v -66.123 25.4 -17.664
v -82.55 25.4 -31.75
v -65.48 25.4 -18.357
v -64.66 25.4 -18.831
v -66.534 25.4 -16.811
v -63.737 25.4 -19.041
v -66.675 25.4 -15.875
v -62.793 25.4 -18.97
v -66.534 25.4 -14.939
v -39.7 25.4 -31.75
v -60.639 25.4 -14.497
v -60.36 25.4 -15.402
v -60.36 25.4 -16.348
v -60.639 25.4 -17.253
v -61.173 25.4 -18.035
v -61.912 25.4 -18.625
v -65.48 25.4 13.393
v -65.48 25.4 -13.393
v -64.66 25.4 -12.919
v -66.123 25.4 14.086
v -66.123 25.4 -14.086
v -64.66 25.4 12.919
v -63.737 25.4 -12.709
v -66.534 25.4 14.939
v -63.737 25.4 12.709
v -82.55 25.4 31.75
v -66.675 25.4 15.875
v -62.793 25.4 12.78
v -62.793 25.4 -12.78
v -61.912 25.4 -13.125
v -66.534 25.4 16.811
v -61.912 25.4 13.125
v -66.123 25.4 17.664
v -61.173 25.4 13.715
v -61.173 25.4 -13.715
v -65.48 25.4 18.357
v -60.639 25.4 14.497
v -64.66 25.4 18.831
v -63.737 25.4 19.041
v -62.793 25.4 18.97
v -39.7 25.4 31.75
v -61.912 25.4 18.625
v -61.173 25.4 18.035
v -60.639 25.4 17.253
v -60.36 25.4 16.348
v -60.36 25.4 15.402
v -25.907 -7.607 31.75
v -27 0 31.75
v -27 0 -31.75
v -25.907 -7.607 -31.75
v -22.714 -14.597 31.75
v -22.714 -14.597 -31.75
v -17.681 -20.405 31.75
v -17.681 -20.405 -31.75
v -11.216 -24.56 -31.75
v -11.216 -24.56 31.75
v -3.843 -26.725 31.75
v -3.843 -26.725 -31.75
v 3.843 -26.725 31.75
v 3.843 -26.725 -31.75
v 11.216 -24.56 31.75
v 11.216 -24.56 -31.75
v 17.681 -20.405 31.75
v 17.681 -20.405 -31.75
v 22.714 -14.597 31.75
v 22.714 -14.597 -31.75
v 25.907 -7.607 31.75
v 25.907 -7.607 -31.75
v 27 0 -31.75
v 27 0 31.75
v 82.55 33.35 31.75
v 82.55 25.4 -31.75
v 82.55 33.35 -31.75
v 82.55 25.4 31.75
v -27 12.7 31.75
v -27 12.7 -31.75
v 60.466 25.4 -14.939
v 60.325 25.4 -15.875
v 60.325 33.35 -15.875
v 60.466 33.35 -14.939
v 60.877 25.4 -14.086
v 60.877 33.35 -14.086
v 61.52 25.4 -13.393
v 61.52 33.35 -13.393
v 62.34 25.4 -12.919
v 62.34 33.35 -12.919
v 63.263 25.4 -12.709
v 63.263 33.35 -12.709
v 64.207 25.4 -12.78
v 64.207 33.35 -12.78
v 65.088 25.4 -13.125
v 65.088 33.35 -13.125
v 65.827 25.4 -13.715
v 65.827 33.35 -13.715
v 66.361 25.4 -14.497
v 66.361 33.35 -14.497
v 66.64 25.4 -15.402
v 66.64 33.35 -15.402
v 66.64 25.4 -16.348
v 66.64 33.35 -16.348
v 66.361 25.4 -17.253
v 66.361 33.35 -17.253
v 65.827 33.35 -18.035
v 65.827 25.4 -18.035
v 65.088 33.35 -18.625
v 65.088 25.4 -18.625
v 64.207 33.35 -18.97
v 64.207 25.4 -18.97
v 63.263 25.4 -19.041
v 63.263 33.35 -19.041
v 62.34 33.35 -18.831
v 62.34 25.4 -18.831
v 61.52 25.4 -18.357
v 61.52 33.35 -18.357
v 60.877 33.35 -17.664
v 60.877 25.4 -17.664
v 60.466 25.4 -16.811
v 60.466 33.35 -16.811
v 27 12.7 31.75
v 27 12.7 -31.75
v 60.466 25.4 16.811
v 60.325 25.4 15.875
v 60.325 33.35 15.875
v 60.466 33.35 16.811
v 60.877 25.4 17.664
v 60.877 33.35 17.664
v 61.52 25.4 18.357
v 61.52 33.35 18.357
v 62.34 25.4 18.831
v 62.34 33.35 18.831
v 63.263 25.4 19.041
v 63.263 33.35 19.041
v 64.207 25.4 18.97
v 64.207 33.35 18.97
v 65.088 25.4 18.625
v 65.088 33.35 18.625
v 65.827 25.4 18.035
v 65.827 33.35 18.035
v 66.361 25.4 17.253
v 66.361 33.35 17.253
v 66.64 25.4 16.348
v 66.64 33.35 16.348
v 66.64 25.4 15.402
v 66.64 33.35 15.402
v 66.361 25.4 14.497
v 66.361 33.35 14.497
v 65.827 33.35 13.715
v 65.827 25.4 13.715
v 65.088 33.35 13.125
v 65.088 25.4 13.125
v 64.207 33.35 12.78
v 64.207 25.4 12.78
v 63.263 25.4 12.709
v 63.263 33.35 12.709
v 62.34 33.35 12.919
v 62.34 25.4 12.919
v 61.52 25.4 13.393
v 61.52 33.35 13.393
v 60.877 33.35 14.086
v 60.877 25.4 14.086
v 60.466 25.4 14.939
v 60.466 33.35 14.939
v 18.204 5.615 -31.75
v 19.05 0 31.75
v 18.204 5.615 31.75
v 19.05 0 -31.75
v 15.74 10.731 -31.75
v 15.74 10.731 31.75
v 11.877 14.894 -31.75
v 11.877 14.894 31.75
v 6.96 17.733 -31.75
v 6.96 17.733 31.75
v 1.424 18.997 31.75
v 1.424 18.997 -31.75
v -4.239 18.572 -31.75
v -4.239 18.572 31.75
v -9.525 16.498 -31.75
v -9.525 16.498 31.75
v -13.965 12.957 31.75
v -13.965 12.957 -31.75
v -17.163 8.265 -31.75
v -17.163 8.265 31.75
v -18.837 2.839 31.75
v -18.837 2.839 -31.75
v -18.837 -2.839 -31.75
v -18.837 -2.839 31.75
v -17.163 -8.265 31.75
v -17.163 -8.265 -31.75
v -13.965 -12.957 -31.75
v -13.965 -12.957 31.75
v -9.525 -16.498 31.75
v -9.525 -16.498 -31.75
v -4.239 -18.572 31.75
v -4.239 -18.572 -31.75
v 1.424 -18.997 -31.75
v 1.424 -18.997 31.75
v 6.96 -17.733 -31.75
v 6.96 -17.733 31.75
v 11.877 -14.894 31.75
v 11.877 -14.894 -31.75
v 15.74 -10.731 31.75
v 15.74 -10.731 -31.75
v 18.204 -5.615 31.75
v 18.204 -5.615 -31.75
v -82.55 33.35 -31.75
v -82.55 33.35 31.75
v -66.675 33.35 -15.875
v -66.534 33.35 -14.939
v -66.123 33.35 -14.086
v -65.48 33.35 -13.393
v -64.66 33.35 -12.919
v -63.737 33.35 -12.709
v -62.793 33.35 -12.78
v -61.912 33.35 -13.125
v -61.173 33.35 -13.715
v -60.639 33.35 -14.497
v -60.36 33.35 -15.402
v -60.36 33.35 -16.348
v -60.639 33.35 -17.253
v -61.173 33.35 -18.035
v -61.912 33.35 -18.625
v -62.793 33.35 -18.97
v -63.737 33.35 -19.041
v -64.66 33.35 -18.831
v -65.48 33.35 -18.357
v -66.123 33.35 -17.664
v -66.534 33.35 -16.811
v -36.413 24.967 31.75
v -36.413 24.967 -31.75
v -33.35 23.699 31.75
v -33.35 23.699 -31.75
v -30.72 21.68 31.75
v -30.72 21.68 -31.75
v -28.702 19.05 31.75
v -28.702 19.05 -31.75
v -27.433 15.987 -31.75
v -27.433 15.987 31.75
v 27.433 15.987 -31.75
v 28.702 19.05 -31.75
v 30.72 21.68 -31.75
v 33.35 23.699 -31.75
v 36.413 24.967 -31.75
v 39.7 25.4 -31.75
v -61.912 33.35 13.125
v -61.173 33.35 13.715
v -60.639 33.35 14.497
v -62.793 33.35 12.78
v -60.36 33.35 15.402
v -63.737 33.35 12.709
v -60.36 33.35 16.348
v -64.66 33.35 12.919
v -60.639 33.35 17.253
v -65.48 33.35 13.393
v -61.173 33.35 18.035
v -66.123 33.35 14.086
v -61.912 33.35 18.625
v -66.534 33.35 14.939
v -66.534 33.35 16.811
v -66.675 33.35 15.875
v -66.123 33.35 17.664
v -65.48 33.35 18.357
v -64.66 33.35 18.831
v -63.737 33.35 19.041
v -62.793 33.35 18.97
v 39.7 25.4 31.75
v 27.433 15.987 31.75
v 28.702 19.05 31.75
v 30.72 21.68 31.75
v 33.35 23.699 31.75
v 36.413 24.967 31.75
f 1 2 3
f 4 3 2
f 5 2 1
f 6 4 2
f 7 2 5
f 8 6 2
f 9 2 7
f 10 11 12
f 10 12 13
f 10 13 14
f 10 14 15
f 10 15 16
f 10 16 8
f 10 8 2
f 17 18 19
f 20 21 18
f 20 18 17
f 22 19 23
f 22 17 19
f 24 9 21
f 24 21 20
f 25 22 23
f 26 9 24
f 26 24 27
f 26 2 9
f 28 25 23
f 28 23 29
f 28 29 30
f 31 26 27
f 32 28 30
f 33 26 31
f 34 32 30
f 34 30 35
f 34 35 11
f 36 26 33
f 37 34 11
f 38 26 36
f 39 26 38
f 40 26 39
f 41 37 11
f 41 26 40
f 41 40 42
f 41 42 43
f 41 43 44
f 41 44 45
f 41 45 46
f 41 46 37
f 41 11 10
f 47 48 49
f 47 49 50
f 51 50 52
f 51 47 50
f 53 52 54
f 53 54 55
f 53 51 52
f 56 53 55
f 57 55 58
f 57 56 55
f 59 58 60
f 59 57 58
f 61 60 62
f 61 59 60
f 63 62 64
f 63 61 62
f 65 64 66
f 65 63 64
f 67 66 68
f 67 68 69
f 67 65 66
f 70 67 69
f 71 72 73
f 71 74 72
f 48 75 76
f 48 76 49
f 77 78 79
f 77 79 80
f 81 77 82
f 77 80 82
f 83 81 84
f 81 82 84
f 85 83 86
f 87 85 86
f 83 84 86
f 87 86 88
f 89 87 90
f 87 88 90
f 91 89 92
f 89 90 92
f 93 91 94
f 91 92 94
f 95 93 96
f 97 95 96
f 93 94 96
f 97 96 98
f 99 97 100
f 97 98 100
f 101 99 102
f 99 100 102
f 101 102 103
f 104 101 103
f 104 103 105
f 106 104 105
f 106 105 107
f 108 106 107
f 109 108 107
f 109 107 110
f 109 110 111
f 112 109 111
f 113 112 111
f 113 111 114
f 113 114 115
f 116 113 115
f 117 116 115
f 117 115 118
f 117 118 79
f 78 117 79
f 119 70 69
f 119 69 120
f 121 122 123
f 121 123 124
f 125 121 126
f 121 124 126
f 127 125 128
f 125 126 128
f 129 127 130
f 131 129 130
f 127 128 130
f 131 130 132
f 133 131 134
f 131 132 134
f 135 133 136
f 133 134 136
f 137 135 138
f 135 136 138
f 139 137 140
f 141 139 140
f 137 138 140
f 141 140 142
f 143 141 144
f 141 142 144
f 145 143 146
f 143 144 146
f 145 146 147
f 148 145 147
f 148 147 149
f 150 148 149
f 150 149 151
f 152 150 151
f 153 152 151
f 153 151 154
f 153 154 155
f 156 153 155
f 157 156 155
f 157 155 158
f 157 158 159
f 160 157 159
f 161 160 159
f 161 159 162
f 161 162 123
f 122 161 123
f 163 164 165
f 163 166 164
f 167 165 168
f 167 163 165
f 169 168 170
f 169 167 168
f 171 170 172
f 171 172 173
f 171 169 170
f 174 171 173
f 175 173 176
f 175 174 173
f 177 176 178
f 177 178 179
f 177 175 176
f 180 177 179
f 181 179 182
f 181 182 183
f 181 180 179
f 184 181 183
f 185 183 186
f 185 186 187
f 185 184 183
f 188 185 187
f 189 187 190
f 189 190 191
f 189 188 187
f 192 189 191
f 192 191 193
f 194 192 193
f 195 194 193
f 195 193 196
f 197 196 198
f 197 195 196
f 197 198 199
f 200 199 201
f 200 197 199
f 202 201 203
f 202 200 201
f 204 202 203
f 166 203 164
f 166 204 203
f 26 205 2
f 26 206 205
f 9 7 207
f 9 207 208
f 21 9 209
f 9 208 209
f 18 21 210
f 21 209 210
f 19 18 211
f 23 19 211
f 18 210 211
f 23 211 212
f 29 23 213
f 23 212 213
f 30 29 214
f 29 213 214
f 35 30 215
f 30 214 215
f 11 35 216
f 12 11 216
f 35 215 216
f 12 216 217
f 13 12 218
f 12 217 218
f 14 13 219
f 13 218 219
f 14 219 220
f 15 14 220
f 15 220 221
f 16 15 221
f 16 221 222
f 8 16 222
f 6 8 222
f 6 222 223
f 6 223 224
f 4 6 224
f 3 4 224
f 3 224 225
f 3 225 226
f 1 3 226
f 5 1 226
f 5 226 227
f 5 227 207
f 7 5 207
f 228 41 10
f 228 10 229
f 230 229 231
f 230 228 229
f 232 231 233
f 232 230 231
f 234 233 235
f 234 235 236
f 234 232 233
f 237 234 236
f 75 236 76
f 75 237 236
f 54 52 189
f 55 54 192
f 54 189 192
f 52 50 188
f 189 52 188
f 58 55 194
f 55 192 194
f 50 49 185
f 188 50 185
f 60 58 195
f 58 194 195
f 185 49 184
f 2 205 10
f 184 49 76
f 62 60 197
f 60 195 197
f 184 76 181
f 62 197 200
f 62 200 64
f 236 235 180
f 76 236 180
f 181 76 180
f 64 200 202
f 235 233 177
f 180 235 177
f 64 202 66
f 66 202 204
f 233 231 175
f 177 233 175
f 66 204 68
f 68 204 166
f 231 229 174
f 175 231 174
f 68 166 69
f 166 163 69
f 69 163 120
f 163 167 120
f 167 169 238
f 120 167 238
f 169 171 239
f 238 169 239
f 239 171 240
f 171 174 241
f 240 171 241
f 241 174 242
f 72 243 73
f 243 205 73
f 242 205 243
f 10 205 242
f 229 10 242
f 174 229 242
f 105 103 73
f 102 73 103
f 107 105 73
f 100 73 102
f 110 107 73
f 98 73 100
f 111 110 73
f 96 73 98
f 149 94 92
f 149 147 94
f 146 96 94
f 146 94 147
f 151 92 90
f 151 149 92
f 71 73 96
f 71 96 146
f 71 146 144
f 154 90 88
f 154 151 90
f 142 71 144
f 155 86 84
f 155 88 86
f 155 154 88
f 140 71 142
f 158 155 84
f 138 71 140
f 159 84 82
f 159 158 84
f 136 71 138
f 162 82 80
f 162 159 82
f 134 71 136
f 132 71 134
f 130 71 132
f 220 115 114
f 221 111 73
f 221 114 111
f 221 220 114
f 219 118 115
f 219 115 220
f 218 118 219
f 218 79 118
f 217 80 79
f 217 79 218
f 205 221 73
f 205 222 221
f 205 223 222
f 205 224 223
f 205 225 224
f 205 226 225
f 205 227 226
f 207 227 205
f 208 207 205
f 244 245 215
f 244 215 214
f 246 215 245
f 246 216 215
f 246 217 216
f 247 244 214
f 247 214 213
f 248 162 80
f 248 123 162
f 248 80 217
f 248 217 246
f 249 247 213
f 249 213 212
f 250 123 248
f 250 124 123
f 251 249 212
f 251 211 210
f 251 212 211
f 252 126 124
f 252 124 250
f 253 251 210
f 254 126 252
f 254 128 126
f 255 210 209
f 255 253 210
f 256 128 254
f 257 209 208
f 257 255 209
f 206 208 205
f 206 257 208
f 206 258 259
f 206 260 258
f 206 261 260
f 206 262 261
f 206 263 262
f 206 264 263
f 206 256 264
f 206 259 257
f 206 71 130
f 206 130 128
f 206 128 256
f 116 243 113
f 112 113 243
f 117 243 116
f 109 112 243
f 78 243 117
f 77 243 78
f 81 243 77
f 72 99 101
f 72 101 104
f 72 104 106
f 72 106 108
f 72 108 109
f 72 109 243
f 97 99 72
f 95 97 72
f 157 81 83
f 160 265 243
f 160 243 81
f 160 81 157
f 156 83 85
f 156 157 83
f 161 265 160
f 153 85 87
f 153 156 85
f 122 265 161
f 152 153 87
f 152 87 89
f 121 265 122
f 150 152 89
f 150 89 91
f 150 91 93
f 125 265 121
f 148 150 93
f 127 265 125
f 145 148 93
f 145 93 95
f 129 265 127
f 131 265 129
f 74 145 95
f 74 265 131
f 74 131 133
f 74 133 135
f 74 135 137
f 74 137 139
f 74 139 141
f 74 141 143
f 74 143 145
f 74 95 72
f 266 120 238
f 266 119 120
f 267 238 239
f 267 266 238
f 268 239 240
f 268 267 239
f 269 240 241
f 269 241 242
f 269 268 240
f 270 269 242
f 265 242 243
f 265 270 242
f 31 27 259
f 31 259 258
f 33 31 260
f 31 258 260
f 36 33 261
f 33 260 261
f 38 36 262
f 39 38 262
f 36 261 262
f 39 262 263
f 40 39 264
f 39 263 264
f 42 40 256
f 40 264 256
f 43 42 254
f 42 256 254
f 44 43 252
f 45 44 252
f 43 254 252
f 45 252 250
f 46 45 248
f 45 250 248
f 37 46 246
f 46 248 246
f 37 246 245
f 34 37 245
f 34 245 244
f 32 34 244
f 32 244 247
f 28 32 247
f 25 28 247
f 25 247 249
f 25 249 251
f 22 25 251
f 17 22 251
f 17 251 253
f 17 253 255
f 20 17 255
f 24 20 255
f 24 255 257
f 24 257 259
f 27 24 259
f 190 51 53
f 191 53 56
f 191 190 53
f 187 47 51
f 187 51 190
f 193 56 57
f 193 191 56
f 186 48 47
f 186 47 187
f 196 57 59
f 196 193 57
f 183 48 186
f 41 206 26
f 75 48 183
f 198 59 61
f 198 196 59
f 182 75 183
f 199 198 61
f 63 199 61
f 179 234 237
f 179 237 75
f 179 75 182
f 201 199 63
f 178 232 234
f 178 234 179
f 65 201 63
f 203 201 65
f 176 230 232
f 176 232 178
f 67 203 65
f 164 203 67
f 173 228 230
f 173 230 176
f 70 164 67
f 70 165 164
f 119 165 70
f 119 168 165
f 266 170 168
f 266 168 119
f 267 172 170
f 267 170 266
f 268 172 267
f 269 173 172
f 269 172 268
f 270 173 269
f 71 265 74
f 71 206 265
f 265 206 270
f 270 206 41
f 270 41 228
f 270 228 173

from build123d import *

# Parameters (mm, degrees)
SKETCH1_R           = 19.05
BOSS_EXTRUDE1_DEPTH = 31.75
SKETCH2_R           = 3.175
CUT_EXTRUDE1_DEPTH  = 108.073506434


with BuildPart() as part:
    # Sketch1 → Boss-Extrude1 (new, symmetric)
    with BuildSketch(Plane.XY):
        with BuildLine():
            Line((-82.55, 33.3502), (-82.55, 25.4))
            Line((-82.55, 25.4), (-39.7002, 25.4))
            ThreePointArc((-39.7002, 25.4), (-30.719943879, 21.680256121), (-27.0002, 12.7))
            Line((-27.0002, 12.7), (-27.0002, 0))
            ThreePointArc((-27.0002, 0), (0, -27.0002), (27.0002, 0))
            Line((27.0002, 0), (27.0002, 12.7))
            ThreePointArc((27.0002, 12.7), (30.719943879, 21.680256121), (39.7002, 25.4))
            Line((39.7002, 25.4), (82.55, 25.4))
            Line((82.55, 25.4), (82.55, 33.3502))
            Line((82.55, 33.3502), (-82.55, 33.3502))
        make_face()
        Circle(SKETCH1_R, mode=Mode.SUBTRACT)
    extrude(amount=BOSS_EXTRUDE1_DEPTH, both=True)

    # Sketch2 → Cut-Extrude1 (cut, through all)
    with BuildSketch(Plane(origin=(0, 33.3502, 0), x_dir=(1, 0, 0), z_dir=(0, 1, 0))):
        with Locations(Location((-63.5, 15.875, 0), (0, 0, 180))):
            Circle(SKETCH2_R)
        with Locations(Location((-63.5, -15.875, 0), (0, 0, 180))):
            Circle(SKETCH2_R)
        with Locations(Location((63.5, -15.875, 0), (0, 0, 180))):
            Circle(SKETCH2_R)
        with Locations(Location((63.5, 15.875, 0), (0, 0, 180))):
            Circle(SKETCH2_R)
    extrude(amount=-CUT_EXTRUDE1_DEPTH, mode=Mode.SUBTRACT)


solid = part.part
